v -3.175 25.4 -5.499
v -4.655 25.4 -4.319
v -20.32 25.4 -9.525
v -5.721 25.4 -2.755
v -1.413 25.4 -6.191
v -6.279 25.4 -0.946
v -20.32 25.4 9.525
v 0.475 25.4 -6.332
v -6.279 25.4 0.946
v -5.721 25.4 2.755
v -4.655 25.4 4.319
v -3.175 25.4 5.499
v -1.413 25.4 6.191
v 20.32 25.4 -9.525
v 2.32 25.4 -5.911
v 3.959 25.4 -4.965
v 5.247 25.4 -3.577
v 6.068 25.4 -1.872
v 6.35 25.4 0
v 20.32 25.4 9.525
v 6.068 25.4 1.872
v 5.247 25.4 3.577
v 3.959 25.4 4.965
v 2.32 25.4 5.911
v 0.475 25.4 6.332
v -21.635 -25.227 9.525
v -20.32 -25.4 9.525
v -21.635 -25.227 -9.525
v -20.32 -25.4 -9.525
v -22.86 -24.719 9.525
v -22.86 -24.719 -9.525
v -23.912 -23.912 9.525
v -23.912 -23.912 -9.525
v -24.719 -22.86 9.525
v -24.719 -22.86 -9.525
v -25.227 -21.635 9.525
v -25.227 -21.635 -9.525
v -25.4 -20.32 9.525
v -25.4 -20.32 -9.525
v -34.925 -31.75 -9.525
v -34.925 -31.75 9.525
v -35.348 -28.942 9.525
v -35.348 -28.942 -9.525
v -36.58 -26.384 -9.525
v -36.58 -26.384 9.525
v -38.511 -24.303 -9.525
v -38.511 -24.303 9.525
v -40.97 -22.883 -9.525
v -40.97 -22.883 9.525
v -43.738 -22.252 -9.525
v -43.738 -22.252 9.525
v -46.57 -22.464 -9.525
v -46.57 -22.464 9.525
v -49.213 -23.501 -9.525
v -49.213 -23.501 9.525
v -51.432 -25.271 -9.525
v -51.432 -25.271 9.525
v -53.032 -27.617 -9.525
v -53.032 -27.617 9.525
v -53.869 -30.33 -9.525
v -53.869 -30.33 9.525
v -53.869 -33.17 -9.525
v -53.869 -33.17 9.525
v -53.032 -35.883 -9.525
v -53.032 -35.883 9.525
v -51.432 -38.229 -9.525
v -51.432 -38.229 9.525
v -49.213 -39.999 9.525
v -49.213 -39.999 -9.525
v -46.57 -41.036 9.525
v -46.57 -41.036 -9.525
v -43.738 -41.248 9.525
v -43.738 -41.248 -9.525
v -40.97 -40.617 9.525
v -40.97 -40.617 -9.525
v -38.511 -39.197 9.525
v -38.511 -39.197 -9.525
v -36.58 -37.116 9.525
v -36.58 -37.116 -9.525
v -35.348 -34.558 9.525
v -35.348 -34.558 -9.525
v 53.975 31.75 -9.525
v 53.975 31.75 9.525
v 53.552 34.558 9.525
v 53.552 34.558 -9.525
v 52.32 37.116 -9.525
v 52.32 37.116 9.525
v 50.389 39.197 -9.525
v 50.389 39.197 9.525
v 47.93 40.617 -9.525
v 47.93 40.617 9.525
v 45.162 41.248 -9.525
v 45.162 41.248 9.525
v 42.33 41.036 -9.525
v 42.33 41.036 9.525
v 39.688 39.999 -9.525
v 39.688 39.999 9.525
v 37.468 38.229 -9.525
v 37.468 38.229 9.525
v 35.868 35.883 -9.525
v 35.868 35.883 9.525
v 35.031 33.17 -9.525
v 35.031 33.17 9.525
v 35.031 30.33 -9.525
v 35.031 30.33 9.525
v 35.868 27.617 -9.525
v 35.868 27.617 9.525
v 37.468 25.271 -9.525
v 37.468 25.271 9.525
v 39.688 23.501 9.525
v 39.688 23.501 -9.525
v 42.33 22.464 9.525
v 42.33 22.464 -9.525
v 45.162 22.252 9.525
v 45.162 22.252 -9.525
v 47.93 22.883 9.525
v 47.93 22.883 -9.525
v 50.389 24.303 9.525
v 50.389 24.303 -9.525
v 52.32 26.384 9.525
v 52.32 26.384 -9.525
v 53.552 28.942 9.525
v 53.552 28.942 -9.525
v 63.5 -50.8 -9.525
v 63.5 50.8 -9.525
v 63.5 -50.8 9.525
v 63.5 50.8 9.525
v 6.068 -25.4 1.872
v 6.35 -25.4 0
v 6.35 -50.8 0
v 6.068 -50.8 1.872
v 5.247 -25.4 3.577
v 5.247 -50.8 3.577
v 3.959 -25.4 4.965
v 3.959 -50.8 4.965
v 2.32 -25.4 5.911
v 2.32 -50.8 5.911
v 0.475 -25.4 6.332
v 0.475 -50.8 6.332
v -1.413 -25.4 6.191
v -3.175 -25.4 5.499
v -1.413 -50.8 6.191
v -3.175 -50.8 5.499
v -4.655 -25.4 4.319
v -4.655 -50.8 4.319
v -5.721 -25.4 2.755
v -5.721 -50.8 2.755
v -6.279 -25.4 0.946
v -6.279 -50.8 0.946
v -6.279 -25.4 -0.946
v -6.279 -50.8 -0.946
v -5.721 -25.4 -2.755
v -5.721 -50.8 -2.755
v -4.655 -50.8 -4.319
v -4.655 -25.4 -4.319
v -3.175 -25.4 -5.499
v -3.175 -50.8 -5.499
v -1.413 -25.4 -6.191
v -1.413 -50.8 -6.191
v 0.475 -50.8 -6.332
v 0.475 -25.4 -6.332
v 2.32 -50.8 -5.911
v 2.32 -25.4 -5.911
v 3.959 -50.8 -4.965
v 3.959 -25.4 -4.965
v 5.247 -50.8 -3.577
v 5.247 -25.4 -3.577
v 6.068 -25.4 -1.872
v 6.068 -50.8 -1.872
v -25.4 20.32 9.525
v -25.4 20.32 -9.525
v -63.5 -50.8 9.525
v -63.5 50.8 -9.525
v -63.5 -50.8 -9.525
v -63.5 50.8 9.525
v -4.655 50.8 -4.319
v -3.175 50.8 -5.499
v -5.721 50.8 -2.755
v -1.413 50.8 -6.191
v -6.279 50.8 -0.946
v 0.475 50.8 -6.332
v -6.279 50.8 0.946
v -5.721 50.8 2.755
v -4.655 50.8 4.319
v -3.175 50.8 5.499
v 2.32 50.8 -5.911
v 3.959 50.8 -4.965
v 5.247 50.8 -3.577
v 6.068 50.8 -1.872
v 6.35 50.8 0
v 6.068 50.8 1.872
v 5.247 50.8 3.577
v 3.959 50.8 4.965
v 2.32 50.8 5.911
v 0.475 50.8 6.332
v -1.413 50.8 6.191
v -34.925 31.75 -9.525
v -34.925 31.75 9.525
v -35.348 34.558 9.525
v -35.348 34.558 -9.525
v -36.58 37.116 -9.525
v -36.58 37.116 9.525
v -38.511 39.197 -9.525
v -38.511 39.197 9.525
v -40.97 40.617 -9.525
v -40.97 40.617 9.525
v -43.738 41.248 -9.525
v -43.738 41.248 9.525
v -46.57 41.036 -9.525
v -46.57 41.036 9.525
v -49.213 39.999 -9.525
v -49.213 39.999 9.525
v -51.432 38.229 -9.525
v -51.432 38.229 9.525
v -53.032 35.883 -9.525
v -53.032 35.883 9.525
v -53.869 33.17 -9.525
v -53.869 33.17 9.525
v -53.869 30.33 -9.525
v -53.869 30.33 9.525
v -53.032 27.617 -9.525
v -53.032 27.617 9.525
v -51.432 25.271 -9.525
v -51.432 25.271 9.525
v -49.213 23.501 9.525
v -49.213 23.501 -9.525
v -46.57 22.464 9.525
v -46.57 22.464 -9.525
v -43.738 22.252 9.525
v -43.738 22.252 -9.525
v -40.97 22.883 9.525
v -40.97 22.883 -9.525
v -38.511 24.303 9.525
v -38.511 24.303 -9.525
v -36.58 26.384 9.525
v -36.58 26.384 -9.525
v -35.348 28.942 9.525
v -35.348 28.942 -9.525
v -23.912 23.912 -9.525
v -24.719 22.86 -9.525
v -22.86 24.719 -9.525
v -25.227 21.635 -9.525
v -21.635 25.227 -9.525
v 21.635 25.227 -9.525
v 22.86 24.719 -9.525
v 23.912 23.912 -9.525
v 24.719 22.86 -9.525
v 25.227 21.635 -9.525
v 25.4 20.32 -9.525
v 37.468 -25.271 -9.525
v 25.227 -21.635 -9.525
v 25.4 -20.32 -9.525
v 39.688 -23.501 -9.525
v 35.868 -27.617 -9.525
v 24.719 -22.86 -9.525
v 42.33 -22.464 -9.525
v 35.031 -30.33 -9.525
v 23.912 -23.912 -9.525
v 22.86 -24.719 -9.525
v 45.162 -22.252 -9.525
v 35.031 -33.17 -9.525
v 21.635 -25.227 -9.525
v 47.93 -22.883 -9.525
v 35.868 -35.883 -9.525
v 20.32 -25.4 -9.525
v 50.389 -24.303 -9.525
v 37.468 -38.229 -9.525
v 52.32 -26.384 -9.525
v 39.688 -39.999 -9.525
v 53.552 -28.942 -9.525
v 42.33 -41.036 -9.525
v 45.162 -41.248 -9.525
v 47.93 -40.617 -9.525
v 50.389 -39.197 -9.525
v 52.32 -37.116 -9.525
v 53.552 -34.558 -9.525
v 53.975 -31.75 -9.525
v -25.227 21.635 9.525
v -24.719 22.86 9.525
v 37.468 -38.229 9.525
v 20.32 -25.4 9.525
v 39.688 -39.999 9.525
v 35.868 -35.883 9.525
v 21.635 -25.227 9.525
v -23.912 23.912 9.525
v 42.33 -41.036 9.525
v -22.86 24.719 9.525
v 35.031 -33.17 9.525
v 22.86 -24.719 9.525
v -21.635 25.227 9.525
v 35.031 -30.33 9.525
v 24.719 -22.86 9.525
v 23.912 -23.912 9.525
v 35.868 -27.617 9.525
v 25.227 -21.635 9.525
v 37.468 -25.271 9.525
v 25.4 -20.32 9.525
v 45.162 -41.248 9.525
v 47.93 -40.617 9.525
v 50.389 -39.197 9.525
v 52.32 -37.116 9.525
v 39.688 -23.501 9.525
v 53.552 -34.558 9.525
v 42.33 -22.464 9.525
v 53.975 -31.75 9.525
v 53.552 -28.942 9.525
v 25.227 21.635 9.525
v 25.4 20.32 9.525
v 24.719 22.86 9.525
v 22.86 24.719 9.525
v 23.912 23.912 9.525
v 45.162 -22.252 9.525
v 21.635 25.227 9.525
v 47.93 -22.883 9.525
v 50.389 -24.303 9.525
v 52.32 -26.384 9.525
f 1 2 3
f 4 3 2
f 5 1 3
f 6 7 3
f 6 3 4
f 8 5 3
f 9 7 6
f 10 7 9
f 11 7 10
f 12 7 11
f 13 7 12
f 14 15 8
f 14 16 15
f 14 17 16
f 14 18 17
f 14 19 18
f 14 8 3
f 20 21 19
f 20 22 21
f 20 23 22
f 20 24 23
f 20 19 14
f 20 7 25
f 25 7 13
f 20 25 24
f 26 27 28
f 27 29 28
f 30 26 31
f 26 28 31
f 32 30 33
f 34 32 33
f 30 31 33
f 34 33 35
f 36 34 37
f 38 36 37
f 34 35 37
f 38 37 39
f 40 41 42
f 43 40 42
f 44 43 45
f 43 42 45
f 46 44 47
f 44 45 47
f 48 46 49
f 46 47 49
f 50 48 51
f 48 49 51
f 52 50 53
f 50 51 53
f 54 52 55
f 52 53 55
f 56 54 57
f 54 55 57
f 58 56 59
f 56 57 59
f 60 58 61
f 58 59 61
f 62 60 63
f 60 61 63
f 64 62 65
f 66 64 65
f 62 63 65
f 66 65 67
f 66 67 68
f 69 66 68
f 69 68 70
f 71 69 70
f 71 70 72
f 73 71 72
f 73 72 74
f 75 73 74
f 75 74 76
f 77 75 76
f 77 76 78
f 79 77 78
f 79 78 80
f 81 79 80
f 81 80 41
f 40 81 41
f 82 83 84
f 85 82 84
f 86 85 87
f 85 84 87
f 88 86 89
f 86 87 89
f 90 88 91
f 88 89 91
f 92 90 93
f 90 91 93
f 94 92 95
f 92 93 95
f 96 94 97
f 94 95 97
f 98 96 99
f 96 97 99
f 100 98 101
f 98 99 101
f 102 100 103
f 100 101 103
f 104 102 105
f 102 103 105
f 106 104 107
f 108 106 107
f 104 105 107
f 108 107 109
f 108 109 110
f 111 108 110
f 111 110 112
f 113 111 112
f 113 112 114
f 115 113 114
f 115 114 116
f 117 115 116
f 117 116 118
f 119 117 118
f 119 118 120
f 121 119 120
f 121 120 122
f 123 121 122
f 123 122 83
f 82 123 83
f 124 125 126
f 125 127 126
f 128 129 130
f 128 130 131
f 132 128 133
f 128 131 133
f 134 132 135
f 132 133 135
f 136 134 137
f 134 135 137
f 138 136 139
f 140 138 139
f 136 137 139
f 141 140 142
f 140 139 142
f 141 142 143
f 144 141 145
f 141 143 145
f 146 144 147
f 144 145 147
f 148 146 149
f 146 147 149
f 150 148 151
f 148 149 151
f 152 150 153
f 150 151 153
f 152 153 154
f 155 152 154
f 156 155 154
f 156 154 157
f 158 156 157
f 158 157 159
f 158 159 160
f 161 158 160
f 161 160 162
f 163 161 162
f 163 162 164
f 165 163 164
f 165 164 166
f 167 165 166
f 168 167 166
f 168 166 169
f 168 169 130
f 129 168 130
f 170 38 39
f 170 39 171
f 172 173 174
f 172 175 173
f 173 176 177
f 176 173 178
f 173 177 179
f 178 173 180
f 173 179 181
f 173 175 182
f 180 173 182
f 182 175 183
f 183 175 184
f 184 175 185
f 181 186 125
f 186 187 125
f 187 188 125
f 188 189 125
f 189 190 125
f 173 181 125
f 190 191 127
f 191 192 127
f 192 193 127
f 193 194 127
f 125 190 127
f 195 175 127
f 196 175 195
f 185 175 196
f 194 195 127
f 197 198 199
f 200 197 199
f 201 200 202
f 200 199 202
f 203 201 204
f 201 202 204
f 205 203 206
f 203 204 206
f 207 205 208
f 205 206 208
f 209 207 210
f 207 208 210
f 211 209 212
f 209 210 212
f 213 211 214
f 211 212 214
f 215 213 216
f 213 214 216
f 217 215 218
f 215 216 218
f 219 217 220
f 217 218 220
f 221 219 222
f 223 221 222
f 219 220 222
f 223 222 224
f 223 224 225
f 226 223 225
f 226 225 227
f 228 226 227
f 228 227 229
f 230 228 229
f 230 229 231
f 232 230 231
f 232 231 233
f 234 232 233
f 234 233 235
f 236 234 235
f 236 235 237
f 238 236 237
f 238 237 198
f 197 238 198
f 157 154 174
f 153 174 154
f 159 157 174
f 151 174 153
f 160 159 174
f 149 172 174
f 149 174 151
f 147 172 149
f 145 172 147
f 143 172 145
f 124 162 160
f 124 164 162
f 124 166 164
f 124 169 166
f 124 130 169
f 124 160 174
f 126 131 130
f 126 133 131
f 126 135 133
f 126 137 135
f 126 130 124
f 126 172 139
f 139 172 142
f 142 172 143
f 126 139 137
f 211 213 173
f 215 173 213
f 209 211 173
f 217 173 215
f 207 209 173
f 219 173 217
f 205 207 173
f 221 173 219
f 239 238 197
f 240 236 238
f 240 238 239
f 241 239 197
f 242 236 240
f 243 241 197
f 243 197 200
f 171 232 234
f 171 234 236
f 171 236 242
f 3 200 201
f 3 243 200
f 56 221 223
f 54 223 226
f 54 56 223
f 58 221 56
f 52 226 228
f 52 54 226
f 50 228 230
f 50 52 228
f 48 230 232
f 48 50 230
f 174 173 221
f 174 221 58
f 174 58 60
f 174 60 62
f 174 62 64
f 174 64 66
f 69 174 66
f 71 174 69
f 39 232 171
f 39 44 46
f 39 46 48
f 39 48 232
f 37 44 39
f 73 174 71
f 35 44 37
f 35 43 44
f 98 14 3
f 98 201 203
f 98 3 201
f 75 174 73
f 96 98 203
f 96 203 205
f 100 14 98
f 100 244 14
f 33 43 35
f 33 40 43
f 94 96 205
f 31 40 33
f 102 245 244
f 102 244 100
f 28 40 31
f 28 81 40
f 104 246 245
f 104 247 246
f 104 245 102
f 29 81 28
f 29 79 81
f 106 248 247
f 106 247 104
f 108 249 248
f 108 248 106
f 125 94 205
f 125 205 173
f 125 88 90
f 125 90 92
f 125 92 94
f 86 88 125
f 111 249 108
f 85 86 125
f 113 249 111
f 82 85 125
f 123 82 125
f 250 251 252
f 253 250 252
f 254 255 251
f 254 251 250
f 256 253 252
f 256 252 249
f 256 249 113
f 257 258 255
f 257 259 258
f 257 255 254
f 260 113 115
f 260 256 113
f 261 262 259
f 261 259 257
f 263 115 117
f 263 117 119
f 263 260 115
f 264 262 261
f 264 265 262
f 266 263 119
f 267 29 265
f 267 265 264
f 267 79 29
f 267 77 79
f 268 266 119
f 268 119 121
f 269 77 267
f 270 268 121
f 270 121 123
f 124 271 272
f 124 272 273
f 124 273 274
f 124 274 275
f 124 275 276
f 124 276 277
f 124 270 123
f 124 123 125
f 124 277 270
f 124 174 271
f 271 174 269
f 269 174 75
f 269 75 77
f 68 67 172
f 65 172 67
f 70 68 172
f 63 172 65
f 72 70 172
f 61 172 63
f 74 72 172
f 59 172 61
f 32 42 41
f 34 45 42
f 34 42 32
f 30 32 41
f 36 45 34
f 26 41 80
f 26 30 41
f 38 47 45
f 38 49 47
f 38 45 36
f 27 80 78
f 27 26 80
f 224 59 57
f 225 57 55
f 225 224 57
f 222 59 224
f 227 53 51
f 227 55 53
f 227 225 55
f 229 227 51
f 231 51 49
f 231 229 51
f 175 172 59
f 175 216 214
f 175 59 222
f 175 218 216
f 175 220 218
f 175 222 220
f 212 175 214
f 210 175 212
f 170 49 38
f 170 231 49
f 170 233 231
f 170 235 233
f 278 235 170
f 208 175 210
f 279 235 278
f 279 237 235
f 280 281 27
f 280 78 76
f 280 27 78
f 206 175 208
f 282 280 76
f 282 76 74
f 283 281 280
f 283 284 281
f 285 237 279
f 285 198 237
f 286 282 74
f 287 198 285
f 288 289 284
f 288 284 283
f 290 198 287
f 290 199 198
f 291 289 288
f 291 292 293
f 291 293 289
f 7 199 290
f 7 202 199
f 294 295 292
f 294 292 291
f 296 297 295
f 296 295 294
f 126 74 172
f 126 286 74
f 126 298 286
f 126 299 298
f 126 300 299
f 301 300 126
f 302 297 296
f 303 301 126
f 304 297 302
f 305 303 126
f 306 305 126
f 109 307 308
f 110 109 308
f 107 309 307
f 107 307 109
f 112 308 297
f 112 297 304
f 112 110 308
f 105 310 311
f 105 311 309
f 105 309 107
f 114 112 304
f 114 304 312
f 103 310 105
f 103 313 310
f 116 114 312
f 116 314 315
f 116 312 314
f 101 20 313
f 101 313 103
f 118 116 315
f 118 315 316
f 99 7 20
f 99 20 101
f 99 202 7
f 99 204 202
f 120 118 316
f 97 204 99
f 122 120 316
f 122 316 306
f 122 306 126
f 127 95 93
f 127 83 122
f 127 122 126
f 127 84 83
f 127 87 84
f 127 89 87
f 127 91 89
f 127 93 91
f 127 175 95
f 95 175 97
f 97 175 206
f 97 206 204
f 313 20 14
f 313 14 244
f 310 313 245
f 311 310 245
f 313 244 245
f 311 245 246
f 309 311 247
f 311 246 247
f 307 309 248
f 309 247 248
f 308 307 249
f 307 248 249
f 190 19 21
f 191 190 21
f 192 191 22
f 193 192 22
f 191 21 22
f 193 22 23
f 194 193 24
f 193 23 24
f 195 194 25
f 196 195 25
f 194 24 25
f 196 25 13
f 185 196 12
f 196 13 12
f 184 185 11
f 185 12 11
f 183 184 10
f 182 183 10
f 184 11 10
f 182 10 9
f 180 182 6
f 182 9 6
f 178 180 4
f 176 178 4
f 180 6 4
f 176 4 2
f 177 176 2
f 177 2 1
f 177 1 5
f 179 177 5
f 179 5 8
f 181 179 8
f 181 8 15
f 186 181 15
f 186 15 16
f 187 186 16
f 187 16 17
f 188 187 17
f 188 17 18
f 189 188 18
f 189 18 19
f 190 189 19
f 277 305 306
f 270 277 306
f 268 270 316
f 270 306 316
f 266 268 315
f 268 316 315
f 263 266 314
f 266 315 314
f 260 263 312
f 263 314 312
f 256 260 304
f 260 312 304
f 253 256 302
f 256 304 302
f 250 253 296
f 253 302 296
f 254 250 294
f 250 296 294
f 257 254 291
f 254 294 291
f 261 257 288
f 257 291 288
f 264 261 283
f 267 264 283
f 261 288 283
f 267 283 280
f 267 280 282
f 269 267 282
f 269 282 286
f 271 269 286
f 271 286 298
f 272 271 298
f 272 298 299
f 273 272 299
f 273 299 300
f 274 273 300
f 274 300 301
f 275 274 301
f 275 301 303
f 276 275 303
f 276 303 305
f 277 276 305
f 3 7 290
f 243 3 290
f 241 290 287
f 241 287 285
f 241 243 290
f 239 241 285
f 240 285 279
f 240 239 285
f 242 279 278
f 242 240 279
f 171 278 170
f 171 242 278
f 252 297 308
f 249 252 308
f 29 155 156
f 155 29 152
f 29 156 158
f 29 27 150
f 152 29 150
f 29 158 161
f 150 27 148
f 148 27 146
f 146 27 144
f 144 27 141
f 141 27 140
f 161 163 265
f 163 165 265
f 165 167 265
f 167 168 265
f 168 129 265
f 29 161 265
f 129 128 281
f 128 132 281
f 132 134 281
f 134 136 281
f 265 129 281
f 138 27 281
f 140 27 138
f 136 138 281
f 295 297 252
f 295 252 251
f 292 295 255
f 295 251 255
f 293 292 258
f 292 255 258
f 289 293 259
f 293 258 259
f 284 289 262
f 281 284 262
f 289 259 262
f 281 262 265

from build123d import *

# Parameters (mm, degrees)
F0_W      = 127
F0_H      = 101.6
F1_DEPTH  = 9.525
F1_FACE_W = 127
F1_FACE_H = 101.6
F2_DEPTH  = 9.525
F3_W      = 50.8
F3_H      = 50.8
F3_R      = 9.525
F4_DEPTH  = 25.4
F5_R      = 5.08
F6_R      = 6.35
F7_DEPTH  = 116.078


with BuildPart() as f1:
    # F0 (on Top) → F1 (new body)
    with BuildSketch(Plane.XY):
        Rectangle(F0_W, F0_H)
    extrude(amount=F1_DEPTH)

    # F1_face (on face) → F2 (join)
    with BuildSketch(Plane(origin=(0, 0, 0), x_dir=(1, 0, 0), z_dir=(0, 0, -1))):
        Rectangle(F1_FACE_W, F1_FACE_H)
    extrude(amount=F2_DEPTH)

    # F3 (on face) → F4 (cut)
    with BuildSketch(Plane.XY.offset(9.525)):
        Rectangle(F3_W, F3_H)
        with Locations((-44.45, -31.75)):
            Circle(F3_R)
        with Locations((-44.45, 31.75)):
            Circle(F3_R)
        with Locations((44.45, 31.75)):
            Circle(F3_R)
        with Locations((44.45, -31.75)):
            Circle(F3_R)
    extrude(amount=-F4_DEPTH, mode=Mode.SUBTRACT)

    # F5
    f5_edges = [f1.edges().sort_by_distance(p)[0] for p in [
        (-25.4, 25.4, 0),
        (-25.4, -25.4, 0),
        (25.4, -25.4, 0),
        (25.4, 25.4, 0),
    ]]
    fillet(f5_edges, radius=F5_R)

    # F6 (on face) → F7 (cut)
    with BuildSketch(Plane.XZ.offset(50.8)):
        Circle(F6_R)
    extrude(amount=-F7_DEPTH, mode=Mode.SUBTRACT)


solid = f1.part
